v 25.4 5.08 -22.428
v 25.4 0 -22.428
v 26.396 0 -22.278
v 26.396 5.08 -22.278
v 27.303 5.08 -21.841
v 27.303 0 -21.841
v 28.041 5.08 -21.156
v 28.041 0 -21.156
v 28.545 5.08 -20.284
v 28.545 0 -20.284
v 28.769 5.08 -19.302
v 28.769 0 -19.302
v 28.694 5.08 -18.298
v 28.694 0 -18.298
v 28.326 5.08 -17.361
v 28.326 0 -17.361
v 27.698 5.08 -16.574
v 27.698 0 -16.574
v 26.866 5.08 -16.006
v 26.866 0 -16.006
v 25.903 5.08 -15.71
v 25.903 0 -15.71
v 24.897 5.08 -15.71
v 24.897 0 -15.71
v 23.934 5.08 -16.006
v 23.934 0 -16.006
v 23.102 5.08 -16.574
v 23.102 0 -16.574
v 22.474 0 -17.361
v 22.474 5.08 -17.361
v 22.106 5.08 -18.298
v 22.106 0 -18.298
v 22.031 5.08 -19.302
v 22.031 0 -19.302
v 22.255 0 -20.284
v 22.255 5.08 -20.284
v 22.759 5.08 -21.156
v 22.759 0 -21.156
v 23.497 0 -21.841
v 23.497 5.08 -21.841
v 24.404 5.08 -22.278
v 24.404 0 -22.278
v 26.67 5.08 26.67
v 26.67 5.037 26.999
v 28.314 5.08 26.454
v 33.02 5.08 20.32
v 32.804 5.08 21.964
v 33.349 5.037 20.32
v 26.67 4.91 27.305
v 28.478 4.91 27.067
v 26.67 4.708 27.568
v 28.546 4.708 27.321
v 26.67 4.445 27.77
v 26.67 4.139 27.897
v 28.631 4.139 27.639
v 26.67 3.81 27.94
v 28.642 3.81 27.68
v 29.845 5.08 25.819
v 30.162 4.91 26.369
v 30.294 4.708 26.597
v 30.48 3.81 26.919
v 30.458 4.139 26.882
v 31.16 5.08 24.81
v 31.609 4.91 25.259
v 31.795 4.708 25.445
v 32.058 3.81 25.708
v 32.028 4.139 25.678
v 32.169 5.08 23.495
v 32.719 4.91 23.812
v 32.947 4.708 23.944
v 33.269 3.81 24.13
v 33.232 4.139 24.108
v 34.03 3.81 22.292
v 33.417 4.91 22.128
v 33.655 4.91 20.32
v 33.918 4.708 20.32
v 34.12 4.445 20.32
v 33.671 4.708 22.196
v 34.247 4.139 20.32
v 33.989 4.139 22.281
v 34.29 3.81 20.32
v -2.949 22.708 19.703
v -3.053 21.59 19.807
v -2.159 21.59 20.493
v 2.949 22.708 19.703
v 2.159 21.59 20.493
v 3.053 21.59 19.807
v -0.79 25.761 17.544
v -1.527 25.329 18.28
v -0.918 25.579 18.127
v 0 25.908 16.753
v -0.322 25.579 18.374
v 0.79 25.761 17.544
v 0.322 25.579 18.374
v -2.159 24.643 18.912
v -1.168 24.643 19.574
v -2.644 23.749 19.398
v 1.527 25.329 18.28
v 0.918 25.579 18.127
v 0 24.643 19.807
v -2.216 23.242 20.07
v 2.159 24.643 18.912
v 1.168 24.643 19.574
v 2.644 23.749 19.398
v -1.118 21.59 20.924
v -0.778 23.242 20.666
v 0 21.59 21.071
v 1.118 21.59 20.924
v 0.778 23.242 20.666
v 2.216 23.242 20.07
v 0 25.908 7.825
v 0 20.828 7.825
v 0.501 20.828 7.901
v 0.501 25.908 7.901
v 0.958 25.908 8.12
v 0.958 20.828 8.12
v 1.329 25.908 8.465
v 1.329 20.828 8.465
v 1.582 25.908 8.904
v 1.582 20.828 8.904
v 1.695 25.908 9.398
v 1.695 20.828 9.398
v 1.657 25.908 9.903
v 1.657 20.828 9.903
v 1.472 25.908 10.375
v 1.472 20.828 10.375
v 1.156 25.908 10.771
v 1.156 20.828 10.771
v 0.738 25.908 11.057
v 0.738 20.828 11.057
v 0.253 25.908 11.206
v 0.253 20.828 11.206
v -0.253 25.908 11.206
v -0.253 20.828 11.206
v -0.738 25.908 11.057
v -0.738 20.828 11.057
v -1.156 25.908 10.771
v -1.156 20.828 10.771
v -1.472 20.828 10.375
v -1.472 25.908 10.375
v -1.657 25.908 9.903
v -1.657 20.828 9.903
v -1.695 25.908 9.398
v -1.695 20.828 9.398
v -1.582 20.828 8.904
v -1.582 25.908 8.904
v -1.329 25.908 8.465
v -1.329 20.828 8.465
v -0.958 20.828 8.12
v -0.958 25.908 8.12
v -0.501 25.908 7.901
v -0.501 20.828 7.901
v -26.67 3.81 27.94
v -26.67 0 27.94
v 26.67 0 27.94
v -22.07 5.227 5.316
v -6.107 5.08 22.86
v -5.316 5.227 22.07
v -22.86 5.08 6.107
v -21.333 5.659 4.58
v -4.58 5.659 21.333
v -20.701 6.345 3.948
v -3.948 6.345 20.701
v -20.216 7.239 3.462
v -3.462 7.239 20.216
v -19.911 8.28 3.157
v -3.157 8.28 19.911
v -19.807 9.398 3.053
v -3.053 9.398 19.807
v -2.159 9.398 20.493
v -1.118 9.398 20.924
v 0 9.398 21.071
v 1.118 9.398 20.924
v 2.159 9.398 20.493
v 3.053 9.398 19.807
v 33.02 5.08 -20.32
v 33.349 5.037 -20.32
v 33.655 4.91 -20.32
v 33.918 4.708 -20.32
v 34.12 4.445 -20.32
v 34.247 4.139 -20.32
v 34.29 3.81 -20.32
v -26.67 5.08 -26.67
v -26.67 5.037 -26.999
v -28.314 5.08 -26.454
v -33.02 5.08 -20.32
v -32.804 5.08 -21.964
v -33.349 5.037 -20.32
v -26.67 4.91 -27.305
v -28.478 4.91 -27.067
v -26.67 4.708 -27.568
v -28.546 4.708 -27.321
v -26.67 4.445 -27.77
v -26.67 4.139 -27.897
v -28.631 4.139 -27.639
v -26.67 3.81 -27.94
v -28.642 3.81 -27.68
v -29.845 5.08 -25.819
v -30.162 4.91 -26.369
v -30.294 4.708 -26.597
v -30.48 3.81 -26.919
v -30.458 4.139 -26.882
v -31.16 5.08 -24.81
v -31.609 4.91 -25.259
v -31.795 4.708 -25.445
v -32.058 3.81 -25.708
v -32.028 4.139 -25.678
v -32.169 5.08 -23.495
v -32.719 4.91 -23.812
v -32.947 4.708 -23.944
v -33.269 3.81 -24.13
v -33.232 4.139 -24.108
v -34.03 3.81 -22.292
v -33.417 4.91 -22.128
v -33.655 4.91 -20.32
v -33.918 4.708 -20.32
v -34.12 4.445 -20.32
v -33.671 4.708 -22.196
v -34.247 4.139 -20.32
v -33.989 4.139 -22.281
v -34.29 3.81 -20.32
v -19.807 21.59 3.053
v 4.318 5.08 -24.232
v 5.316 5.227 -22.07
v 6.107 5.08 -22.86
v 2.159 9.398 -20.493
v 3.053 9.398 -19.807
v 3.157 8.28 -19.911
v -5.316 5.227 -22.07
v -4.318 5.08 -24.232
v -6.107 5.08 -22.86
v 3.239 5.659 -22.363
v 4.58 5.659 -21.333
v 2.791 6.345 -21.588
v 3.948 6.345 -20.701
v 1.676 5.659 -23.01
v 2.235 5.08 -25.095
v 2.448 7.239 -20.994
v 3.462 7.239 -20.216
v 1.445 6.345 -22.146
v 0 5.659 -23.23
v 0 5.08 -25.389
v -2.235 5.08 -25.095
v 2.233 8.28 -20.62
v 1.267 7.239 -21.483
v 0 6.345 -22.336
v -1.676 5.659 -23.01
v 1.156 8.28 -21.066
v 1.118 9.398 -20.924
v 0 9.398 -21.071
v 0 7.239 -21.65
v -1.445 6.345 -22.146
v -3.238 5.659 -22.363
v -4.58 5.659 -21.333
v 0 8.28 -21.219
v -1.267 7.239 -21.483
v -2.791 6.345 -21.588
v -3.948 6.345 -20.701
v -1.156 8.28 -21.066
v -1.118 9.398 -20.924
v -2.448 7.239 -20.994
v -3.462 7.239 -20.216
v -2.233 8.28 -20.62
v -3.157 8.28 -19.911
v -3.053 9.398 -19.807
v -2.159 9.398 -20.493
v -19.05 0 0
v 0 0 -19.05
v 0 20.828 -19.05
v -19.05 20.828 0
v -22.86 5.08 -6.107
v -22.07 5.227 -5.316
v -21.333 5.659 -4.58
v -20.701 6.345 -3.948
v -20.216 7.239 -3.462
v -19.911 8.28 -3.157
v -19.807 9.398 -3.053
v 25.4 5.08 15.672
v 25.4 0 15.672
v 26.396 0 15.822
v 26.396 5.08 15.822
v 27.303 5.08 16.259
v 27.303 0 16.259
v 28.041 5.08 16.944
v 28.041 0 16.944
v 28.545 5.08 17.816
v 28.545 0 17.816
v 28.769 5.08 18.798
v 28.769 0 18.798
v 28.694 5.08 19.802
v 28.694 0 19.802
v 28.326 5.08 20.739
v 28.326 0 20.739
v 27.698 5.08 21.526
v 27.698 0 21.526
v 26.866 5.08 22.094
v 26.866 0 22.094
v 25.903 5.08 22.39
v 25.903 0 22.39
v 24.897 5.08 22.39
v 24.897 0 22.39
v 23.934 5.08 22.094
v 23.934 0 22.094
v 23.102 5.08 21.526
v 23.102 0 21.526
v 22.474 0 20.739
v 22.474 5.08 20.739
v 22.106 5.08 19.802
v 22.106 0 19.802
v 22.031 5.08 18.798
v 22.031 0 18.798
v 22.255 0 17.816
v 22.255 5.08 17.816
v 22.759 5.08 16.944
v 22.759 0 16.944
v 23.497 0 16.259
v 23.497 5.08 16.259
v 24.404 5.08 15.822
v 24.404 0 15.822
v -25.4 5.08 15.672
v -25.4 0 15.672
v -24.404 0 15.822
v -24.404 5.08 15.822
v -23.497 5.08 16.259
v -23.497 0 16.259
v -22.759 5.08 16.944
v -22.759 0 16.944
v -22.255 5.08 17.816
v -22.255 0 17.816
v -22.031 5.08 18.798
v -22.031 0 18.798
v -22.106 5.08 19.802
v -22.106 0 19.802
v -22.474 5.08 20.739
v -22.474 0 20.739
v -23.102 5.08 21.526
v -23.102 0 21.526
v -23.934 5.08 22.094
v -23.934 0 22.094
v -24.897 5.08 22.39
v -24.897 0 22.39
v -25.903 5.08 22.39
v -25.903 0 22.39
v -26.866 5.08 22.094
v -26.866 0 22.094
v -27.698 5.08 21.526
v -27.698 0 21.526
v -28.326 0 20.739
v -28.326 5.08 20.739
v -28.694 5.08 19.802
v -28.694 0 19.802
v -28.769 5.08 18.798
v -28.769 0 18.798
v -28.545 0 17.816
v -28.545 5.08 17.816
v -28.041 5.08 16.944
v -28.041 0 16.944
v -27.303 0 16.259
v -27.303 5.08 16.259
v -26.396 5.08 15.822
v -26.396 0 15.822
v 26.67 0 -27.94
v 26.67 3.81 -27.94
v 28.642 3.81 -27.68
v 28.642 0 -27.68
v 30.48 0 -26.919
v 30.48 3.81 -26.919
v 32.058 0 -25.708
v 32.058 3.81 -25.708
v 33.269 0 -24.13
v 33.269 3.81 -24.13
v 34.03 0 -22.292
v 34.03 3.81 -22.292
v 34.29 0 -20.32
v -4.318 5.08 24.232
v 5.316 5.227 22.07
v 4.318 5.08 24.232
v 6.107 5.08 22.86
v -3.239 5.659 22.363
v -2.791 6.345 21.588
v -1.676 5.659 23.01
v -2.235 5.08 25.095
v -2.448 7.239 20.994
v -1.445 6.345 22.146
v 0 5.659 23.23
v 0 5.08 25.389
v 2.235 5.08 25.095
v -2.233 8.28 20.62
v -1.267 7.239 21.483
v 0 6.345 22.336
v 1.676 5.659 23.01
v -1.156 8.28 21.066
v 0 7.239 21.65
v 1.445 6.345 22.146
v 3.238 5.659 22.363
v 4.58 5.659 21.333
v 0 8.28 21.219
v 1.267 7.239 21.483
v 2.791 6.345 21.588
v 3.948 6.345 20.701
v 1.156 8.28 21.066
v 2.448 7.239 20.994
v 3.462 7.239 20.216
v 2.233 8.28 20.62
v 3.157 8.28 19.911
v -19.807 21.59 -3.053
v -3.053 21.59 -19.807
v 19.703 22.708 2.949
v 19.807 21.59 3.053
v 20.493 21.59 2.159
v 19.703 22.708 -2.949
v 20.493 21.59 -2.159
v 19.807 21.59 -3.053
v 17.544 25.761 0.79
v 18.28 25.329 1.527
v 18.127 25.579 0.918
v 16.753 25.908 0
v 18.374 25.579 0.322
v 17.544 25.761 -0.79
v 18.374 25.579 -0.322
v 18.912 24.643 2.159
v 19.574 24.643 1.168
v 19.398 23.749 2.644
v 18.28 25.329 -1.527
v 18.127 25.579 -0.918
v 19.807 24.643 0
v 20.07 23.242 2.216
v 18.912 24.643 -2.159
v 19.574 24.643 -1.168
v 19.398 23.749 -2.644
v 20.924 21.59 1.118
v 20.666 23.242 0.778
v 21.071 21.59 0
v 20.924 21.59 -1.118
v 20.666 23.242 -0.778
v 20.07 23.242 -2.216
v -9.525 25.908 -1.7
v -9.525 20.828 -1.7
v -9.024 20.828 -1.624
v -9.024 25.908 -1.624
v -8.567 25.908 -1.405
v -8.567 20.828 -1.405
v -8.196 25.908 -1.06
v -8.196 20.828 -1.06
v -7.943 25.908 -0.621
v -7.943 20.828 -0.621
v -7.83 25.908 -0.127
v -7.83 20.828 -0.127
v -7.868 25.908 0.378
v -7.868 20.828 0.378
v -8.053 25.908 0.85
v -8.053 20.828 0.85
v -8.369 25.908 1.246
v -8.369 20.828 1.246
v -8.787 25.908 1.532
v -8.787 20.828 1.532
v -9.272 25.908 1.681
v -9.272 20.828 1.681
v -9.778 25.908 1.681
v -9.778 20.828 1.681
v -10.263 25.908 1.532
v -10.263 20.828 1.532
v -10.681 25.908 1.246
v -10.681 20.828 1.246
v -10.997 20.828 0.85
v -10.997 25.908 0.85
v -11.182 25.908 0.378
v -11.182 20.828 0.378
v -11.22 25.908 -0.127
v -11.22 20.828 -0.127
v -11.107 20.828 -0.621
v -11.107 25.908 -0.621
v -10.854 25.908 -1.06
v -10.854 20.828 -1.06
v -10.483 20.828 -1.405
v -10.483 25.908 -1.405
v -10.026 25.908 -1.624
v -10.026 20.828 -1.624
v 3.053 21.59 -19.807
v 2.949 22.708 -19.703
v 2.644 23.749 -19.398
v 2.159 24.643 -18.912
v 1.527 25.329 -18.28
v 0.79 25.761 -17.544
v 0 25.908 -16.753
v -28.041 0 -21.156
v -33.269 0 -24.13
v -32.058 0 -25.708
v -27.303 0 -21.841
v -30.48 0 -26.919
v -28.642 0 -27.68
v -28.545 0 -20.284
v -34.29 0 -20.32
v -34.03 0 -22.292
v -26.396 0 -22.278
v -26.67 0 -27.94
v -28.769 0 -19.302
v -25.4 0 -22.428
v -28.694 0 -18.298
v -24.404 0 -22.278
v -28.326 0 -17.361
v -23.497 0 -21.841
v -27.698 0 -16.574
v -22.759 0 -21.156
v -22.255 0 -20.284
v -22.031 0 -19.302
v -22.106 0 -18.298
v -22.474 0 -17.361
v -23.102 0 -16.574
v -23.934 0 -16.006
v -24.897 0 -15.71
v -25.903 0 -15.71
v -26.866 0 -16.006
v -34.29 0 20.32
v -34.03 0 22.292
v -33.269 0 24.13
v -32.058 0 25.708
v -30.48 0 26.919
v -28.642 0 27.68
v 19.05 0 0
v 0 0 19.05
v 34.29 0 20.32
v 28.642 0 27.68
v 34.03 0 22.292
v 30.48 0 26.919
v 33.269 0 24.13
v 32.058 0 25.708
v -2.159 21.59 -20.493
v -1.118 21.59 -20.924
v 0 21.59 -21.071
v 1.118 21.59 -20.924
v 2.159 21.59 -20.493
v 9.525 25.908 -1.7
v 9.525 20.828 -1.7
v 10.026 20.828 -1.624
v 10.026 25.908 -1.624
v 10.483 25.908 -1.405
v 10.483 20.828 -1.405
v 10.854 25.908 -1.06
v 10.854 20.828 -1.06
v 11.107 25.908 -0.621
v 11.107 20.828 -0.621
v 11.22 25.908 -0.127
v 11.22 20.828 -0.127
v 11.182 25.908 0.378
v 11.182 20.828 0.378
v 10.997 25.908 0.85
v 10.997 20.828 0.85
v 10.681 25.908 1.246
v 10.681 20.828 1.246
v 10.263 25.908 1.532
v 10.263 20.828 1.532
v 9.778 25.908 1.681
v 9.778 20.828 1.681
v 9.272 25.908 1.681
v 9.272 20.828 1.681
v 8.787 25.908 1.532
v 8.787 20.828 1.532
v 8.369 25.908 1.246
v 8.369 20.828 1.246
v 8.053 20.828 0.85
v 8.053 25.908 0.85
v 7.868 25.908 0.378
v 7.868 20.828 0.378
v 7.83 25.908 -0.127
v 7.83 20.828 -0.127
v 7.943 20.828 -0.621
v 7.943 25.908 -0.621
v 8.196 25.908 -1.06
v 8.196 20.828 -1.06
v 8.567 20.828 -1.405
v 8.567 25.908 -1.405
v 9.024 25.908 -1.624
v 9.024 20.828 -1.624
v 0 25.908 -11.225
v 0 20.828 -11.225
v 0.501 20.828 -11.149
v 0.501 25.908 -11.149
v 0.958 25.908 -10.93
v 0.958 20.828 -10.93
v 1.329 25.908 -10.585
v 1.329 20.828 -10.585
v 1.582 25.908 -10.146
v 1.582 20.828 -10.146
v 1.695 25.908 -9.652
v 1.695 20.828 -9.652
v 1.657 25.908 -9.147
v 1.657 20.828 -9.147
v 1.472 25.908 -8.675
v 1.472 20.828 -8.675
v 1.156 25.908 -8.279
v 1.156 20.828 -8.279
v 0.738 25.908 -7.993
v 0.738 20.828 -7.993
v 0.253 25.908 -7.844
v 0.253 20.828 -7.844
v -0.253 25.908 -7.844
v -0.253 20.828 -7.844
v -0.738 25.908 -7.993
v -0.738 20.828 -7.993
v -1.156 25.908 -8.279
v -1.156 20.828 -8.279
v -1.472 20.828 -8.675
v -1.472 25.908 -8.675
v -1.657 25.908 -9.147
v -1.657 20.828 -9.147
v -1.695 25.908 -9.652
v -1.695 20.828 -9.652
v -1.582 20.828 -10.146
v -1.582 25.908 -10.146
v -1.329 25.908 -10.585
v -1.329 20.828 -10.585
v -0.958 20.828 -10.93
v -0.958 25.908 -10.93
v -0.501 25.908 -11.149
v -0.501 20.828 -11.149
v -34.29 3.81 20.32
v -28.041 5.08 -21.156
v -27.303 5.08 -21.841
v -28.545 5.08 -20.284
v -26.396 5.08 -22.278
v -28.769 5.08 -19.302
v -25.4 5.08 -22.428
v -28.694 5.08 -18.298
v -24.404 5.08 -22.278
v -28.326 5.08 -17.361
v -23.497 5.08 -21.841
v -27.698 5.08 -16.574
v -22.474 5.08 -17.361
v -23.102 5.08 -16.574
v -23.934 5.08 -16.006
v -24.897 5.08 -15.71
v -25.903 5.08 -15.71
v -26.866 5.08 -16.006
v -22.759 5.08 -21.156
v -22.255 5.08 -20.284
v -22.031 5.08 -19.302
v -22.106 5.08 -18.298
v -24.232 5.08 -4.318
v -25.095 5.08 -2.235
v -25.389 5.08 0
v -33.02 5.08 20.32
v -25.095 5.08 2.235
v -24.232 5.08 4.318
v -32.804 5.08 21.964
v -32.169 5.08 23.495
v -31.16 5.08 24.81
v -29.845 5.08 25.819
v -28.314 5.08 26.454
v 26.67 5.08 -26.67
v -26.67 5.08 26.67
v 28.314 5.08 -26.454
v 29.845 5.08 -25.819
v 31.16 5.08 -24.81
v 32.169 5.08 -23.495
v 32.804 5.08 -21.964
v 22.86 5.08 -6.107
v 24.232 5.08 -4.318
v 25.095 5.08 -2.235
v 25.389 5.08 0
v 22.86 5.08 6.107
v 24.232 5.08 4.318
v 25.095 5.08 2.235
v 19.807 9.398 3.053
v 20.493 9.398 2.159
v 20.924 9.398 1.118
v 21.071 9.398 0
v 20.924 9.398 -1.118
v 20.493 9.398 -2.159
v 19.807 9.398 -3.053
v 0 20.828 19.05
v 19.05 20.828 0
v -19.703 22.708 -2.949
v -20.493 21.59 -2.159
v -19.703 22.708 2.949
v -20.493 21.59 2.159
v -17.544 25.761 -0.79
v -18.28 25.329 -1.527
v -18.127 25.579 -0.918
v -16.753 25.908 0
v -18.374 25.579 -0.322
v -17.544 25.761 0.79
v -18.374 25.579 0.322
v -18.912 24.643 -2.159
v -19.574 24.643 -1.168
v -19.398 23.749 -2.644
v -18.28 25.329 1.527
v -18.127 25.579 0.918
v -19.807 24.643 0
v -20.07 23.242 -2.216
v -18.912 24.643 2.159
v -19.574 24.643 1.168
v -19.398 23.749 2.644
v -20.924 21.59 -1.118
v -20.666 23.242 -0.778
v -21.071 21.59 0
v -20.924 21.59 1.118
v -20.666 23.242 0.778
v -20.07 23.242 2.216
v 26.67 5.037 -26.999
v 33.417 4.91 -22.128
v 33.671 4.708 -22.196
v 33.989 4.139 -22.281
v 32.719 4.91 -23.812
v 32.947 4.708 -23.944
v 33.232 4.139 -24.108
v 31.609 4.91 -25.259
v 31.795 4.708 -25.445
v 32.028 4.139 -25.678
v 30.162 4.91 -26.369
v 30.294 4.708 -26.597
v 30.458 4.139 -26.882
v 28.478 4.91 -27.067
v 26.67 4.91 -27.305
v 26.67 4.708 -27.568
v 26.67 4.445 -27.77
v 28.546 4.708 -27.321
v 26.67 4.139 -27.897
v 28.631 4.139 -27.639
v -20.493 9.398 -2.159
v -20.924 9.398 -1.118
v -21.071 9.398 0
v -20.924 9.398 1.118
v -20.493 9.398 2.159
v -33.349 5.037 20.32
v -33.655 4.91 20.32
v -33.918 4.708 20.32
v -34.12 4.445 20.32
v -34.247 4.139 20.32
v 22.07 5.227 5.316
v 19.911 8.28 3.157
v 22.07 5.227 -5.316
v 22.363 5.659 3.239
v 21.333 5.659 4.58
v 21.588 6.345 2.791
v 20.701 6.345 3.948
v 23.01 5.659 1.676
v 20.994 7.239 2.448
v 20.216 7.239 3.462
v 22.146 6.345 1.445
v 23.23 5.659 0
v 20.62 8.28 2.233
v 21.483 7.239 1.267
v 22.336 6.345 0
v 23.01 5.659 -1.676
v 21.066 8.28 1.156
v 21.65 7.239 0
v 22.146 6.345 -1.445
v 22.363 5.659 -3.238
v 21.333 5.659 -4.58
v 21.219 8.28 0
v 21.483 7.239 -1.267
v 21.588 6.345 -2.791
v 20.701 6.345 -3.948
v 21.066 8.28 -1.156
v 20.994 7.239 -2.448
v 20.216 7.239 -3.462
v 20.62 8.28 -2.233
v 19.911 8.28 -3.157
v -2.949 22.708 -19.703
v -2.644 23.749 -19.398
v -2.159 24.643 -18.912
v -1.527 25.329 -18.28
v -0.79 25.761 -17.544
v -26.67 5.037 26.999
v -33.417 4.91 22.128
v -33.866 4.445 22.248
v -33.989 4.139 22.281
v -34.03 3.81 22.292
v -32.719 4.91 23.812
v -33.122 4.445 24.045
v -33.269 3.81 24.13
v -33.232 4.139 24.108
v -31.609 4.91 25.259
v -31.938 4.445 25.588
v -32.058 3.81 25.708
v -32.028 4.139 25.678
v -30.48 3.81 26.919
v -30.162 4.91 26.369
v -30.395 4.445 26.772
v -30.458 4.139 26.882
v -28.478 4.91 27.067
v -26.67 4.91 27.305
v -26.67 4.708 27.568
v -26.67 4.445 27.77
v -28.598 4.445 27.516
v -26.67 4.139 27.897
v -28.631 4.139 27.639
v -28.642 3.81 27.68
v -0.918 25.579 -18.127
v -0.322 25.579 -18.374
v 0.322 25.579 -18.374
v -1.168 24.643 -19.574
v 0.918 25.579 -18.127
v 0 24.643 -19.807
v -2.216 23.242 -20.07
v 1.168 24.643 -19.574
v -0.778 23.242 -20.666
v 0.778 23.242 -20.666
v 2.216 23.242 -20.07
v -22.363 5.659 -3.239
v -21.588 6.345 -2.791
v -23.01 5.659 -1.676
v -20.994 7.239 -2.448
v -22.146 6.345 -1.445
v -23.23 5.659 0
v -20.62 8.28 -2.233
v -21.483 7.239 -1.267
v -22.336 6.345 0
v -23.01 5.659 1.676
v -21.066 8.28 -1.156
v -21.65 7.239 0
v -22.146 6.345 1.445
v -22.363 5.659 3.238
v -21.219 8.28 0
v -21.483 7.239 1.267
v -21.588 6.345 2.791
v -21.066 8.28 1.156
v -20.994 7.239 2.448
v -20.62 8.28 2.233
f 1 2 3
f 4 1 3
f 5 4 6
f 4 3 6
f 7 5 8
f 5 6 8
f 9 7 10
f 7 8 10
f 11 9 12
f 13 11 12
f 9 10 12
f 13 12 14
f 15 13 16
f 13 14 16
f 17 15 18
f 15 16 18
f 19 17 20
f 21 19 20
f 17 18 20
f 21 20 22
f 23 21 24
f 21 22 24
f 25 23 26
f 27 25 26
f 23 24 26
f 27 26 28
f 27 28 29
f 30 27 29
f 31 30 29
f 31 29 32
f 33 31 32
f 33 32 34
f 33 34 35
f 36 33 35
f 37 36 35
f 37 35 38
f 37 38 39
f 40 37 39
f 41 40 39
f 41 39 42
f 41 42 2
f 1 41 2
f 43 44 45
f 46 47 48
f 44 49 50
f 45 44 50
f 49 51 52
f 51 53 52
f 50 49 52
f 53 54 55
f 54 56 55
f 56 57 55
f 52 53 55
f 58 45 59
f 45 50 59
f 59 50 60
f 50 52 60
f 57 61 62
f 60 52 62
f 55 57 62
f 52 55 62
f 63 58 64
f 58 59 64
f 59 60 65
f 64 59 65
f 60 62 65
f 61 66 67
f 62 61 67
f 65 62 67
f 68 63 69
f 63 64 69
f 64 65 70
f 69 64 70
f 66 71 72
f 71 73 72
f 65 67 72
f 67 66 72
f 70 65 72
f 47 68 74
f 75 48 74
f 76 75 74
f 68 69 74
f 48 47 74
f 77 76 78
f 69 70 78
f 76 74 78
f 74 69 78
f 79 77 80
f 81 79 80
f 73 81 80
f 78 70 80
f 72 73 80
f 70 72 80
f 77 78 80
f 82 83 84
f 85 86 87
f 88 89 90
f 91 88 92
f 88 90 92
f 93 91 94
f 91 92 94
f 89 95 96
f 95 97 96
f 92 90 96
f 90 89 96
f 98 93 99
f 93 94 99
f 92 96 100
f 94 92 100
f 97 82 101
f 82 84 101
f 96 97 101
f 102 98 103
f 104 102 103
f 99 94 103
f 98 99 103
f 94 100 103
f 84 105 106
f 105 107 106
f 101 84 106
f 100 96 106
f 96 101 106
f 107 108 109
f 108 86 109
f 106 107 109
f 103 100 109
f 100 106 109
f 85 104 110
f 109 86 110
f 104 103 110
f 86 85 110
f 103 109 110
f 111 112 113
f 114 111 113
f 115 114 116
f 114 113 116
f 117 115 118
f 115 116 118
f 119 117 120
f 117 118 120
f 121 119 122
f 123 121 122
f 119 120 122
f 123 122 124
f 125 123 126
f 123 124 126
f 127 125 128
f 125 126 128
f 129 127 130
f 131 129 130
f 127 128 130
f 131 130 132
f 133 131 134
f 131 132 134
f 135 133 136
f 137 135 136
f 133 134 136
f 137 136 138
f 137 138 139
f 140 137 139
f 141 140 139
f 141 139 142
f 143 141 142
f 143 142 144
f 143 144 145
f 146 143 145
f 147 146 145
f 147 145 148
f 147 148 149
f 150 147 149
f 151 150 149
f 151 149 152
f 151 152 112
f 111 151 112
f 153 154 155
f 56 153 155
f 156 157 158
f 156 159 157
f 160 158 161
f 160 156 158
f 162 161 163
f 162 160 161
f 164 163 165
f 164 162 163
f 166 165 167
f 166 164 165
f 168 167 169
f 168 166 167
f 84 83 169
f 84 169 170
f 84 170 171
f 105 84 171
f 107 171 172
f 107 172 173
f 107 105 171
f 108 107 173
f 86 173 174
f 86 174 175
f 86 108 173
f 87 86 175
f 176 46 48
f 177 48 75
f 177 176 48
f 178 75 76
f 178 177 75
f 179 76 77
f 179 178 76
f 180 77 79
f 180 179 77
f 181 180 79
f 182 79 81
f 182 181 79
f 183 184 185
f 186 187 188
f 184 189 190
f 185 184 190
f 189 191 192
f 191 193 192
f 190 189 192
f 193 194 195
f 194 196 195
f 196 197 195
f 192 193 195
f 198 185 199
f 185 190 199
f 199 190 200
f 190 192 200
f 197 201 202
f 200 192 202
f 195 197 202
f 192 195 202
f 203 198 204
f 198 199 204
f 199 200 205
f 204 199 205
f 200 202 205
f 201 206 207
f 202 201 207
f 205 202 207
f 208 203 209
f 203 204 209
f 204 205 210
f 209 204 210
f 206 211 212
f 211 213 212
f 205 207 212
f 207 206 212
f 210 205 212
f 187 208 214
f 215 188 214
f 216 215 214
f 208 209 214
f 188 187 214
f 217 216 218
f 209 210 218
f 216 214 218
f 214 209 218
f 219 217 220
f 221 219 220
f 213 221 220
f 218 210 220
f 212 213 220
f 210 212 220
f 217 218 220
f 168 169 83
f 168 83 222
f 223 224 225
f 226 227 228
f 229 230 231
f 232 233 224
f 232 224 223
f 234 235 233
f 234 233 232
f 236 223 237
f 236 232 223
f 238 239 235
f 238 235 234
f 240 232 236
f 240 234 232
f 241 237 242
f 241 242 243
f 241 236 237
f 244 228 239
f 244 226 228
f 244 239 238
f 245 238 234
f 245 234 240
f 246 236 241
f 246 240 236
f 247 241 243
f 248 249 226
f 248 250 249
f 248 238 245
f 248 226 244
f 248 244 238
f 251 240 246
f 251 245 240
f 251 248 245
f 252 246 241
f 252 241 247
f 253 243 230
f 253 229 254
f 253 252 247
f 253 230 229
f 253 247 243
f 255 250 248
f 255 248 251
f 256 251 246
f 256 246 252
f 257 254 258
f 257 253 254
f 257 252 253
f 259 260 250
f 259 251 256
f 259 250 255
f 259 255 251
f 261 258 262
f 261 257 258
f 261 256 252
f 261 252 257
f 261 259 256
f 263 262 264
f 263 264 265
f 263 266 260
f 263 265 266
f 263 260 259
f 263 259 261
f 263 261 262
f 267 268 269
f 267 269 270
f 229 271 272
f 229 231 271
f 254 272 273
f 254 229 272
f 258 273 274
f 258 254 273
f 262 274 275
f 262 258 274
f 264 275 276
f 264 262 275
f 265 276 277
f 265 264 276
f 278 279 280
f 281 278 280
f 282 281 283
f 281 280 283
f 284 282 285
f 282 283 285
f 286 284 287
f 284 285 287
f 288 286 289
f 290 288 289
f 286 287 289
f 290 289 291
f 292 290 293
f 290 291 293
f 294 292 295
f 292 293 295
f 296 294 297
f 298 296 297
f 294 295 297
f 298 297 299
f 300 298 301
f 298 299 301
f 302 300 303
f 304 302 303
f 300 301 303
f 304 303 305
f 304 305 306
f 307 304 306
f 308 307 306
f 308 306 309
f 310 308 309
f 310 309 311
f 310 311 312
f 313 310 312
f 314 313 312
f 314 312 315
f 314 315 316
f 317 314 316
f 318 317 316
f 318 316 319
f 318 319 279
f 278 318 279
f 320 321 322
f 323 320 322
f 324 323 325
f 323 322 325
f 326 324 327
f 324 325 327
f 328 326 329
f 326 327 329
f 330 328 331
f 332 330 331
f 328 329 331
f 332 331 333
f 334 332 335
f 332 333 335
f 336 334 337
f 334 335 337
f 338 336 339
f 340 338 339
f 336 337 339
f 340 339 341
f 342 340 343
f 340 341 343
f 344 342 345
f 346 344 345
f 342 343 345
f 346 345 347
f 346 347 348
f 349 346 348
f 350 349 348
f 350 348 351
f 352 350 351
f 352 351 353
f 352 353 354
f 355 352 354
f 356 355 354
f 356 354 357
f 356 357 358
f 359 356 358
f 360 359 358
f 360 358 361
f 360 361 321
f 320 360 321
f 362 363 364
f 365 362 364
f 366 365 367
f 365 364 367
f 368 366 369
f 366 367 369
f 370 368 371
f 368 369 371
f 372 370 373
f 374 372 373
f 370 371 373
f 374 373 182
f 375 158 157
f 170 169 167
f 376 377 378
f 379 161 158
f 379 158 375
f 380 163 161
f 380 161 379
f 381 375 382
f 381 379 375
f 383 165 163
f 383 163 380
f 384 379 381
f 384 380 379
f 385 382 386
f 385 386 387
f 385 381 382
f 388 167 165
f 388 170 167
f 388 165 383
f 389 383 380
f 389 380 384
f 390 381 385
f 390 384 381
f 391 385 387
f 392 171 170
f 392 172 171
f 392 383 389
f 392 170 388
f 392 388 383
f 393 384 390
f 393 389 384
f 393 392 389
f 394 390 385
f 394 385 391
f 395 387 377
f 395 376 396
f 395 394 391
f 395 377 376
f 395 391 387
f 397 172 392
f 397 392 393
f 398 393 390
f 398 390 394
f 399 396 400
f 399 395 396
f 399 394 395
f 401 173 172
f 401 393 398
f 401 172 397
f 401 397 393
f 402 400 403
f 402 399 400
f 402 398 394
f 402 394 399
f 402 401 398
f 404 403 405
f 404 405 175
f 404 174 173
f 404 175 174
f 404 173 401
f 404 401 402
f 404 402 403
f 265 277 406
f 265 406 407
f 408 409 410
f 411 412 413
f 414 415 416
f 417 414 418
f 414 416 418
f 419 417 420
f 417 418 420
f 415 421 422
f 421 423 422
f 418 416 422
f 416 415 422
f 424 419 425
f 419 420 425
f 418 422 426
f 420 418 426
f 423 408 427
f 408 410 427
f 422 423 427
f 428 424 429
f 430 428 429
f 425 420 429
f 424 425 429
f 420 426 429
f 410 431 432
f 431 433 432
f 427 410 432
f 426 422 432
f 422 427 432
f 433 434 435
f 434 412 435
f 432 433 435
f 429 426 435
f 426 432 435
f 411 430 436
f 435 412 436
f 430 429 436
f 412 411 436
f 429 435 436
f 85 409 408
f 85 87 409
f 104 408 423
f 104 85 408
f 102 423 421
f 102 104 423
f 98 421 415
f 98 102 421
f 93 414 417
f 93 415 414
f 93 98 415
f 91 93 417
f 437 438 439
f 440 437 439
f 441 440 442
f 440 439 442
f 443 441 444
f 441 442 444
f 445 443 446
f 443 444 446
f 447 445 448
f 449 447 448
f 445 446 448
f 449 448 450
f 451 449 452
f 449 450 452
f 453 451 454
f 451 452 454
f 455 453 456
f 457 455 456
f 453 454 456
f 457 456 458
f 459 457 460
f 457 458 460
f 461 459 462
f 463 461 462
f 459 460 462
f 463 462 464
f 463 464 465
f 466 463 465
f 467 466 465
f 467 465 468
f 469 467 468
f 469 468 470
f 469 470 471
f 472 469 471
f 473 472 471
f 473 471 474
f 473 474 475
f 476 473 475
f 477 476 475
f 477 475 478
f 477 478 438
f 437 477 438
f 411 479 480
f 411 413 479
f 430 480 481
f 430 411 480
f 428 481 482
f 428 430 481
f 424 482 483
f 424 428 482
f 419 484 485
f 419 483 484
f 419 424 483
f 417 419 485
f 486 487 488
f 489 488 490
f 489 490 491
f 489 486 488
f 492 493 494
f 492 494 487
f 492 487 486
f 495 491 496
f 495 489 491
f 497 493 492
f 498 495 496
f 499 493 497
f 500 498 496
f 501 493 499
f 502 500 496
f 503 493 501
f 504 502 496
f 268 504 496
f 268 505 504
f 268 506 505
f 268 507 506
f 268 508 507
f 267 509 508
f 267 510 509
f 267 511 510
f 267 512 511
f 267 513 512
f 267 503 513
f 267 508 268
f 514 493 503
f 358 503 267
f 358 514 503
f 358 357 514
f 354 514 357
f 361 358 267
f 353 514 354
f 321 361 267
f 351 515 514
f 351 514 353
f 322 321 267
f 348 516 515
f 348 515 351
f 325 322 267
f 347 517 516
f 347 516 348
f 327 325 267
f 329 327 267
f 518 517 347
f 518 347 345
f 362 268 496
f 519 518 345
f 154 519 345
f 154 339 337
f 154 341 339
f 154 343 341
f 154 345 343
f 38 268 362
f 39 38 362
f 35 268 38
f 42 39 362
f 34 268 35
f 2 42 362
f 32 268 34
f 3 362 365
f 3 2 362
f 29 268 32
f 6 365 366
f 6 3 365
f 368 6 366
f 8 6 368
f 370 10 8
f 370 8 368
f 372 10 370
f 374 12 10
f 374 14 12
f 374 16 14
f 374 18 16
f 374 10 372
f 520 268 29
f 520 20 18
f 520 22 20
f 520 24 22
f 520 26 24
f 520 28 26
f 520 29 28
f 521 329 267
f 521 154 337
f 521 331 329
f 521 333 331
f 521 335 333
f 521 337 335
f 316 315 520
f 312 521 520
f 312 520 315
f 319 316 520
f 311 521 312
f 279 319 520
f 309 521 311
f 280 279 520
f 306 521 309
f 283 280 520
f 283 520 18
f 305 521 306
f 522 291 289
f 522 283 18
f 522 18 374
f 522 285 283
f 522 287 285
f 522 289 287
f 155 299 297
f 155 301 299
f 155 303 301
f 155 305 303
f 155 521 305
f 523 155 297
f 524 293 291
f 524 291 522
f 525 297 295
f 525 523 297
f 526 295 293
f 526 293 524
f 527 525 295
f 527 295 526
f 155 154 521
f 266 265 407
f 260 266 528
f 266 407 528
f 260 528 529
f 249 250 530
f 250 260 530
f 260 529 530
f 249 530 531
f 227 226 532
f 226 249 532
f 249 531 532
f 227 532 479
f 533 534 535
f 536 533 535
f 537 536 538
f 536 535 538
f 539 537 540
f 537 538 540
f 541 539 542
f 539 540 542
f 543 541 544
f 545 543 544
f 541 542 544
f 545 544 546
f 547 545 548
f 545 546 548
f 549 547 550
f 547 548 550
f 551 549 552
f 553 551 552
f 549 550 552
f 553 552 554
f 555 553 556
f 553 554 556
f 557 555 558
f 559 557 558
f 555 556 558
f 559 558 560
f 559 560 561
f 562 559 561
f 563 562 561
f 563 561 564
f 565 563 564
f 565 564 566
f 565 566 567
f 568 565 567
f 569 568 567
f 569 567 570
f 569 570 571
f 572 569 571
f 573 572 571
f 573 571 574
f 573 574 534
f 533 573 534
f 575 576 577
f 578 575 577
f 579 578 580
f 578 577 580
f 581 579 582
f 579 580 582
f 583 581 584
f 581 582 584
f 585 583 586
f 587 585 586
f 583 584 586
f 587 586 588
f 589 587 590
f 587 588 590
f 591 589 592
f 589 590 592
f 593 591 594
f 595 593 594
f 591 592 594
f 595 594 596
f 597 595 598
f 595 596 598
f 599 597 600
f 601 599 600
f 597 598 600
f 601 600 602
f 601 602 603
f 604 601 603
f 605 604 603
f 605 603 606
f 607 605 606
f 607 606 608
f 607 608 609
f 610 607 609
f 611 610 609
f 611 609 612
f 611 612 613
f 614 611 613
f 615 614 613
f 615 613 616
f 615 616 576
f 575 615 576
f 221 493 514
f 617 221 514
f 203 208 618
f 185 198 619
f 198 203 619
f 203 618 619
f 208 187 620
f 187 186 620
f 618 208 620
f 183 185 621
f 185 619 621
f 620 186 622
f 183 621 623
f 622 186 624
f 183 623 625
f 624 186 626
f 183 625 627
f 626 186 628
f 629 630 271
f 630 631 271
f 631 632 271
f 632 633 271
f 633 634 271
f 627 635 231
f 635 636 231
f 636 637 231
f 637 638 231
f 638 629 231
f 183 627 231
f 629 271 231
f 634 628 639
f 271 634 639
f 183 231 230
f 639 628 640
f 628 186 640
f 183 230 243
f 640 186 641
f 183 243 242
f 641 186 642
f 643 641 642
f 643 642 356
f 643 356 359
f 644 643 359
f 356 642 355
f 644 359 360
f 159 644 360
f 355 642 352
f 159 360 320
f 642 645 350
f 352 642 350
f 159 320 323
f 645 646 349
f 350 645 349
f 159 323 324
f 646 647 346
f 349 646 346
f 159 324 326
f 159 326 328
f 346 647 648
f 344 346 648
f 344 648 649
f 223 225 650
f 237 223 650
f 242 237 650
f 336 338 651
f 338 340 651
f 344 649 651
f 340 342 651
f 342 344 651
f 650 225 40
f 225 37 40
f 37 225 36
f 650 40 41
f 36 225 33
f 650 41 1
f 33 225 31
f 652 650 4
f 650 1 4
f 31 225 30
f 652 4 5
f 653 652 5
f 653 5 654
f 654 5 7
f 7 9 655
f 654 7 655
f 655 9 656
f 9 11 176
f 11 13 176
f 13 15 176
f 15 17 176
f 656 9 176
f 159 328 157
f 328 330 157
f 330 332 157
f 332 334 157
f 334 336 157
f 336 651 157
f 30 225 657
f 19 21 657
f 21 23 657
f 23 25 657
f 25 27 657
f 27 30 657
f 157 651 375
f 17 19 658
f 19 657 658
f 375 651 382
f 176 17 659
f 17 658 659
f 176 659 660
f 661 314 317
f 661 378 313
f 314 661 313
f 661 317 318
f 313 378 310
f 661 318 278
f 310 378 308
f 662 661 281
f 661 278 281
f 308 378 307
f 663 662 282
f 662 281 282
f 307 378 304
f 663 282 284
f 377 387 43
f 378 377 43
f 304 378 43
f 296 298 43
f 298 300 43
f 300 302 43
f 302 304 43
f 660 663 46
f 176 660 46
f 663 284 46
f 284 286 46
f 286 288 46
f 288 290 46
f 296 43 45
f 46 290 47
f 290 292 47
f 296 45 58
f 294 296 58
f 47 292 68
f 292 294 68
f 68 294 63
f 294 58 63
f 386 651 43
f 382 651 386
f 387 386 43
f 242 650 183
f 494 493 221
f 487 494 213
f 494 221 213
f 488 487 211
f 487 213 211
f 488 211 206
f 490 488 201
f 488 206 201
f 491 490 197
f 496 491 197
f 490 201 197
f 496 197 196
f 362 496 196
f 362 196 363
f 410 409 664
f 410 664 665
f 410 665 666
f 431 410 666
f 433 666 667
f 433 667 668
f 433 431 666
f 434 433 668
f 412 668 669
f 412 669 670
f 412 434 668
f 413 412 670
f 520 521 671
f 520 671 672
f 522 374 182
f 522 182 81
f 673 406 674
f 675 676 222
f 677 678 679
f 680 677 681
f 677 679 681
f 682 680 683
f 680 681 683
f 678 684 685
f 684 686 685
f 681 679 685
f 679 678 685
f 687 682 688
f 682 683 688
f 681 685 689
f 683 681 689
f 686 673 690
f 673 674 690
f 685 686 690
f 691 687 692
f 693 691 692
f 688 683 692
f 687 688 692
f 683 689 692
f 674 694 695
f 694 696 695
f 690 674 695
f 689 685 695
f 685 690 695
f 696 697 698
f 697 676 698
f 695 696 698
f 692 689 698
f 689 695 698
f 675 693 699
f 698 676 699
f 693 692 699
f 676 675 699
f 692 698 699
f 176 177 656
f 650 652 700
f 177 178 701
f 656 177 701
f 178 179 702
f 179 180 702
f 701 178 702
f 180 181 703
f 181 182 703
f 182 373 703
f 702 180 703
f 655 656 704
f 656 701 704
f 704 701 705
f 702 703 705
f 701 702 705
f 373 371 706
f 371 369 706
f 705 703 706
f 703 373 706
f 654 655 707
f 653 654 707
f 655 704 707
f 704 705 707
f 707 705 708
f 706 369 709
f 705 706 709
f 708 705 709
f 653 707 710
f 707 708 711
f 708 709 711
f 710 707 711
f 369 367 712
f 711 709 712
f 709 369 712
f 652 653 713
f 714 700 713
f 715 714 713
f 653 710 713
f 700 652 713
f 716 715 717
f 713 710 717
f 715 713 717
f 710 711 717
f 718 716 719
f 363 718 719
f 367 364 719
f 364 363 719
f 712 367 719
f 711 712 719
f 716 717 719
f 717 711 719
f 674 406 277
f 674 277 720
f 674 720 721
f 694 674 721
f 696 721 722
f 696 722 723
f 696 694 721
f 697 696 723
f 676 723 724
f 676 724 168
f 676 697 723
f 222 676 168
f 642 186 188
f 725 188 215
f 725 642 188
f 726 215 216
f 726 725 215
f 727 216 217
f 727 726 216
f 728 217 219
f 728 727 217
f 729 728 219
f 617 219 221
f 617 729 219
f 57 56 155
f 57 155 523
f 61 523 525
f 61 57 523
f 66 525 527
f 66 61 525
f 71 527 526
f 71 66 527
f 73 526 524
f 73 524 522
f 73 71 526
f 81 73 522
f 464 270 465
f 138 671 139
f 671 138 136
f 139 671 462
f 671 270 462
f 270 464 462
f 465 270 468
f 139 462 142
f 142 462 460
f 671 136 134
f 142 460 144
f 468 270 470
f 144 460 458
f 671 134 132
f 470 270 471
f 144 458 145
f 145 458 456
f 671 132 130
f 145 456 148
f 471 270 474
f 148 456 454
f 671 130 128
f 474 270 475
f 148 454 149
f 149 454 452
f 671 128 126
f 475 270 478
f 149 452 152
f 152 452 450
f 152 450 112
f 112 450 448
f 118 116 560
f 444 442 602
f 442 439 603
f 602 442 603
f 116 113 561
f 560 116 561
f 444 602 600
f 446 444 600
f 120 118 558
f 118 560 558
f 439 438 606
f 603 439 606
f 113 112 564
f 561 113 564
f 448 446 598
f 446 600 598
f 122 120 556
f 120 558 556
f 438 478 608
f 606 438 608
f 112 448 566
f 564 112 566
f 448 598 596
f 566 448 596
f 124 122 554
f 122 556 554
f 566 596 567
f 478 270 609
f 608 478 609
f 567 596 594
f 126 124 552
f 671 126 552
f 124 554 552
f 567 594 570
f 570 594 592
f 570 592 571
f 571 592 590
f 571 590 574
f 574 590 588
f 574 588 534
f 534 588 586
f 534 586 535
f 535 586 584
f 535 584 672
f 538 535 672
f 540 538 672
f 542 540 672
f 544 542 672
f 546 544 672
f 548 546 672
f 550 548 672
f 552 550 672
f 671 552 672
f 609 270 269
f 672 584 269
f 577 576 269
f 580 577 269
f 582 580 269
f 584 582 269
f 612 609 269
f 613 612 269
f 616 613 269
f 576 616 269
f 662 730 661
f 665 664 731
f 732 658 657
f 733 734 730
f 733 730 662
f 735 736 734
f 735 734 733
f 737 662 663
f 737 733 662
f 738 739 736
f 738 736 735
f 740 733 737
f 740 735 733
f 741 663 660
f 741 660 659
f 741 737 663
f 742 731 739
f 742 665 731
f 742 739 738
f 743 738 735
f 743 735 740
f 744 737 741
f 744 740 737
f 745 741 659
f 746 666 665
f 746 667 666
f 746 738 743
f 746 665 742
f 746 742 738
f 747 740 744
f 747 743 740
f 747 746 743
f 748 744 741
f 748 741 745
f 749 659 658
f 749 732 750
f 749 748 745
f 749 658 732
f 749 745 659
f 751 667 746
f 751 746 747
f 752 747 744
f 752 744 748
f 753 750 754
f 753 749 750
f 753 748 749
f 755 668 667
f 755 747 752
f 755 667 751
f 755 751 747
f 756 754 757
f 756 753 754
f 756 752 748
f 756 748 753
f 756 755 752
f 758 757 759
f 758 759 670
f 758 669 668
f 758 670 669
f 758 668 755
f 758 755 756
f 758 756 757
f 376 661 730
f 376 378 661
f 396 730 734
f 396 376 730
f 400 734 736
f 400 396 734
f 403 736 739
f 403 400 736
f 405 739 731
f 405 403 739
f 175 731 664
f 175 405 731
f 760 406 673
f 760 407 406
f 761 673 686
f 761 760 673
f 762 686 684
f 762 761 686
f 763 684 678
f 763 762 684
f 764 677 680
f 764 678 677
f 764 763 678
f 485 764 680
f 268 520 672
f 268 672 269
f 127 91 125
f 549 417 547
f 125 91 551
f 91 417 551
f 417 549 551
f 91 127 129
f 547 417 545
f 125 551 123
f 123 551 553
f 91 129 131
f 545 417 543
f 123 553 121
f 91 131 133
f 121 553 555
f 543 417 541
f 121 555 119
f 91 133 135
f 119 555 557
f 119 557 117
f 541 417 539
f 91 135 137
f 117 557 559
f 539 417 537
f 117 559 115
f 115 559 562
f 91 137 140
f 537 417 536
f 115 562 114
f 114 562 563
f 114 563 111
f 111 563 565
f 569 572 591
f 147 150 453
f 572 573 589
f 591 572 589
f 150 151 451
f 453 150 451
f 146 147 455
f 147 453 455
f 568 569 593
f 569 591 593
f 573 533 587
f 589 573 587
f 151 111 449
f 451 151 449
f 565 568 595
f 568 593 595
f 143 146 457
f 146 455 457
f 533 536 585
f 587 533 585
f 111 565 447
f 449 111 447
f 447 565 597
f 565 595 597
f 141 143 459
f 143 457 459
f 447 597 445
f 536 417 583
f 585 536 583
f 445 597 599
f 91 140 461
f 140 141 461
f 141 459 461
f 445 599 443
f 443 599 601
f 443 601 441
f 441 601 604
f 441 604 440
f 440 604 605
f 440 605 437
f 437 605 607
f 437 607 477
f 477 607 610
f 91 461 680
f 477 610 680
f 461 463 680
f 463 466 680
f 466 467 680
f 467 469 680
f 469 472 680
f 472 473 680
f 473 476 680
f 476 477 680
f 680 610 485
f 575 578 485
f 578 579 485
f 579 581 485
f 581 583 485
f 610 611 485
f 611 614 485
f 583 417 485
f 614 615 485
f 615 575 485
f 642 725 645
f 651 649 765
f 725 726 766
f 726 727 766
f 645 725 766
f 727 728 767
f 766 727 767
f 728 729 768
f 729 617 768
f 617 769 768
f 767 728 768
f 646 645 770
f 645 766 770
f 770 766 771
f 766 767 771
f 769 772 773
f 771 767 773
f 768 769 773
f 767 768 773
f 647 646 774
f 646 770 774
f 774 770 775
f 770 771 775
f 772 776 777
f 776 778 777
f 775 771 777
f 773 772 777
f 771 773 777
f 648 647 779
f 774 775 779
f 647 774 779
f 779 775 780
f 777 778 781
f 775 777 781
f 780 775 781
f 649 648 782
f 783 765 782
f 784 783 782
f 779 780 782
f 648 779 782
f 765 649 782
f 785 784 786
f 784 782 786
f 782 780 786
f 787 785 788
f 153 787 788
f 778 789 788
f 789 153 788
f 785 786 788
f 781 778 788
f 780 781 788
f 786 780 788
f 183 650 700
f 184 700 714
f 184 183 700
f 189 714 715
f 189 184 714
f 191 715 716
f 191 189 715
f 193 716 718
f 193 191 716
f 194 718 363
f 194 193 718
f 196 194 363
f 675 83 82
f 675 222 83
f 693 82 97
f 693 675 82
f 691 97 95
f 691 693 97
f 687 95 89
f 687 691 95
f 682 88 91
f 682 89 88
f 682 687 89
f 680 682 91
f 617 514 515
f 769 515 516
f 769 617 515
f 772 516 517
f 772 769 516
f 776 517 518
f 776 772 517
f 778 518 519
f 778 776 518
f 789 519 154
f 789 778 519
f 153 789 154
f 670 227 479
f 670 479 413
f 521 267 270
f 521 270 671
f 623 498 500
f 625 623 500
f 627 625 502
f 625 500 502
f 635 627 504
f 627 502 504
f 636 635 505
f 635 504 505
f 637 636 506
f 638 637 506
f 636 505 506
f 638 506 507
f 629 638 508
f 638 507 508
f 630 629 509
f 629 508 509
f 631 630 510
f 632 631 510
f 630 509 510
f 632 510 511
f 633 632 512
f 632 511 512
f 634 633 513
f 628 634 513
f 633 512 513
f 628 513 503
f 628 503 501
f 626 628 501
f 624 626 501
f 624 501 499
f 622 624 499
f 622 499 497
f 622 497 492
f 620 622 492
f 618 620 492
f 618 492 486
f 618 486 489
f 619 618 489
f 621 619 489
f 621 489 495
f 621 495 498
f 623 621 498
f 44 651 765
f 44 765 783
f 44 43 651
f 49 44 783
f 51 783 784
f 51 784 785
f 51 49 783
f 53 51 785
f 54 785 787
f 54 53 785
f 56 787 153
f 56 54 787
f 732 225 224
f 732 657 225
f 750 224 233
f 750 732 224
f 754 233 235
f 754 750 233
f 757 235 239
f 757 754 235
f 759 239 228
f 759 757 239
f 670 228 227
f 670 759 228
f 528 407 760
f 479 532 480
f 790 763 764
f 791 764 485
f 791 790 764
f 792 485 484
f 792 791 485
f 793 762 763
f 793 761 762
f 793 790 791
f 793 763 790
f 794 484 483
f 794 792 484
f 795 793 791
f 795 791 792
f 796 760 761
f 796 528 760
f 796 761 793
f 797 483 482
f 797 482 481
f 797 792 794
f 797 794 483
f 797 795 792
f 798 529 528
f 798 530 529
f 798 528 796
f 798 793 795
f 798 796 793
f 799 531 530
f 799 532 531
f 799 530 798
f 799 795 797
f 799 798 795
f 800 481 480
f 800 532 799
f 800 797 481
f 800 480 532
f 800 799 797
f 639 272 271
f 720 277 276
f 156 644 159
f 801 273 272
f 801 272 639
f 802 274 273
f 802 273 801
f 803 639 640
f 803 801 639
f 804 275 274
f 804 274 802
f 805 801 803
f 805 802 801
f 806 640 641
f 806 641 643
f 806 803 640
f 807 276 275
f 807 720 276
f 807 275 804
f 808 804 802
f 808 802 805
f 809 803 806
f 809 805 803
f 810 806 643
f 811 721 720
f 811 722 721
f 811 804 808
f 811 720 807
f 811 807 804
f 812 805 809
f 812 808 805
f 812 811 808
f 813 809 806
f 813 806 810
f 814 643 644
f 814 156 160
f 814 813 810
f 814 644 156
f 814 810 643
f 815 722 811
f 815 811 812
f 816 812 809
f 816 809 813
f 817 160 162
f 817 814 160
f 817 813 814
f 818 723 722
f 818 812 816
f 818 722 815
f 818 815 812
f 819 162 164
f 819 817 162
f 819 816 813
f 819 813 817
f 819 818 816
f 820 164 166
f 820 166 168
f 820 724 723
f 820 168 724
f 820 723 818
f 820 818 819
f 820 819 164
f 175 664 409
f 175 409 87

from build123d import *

# Parameters (mm, degrees)
SKETCH4_W               = 63.5
SKETCH4_H               = 50.8
BOSS_EXTRUDE2_DEPTH     = 5.08
F_1_4_CLEARANCE_HOLE2_D = 6.7564
BOSS_EXTRUDE3_DEPTH     = 20.828
M3_CLEARANCE_HOLE1_D    = 3.4
CUT_EXTRUDE1_DEPTH      = 20.828
FILLET2_R               = 4.318
SKETCH13_W              = 68.58
SKETCH13_H              = 55.88
SKETCH13_W_2            = 63.5
SKETCH13_H_2            = 50.8
BOSS_EXTRUDE4_DEPTH     = 5.08
FILLET3_R               = 7.62
FILLET4_R               = 1.27


with BuildPart() as part:
    # Sketch4 → Boss-Extrude2 (new body)
    with BuildSketch(Plane(origin=(0, 0, 0), x_dir=(1, 0, 0), z_dir=(0, 1, 0))):
        Rectangle(SKETCH4_W, SKETCH4_H)
    extrude(amount=BOSS_EXTRUDE2_DEPTH)

    # 1/4 Clearance Hole2 (through all)
    with Locations(Plane(origin=(-25.4, 5.08, -19.05), x_dir=(0, 0, 1), z_dir=(0, 1, 0))):
        with Locations((0, 0), (0, 50.8), (38.1, 50.8), (38.1, 0)):
            Hole(F_1_4_CLEARANCE_HOLE2_D / 2)

    # Sketch7 → Boss-Extrude3 (add)
    with BuildSketch(Plane(origin=(0, 5.08, 0), x_dir=(1, 0, 0), z_dir=(0, 1, 0))):
        Polygon((0, 22.86), (22.86, 0), (0, -22.86), (-22.86, 0), align=None)
    extrude(amount=BOSS_EXTRUDE3_DEPTH)

    # M3 Clearance Hole1 (through all)
    with Locations(Plane(origin=(0, 25.908, -9.525), x_dir=(0, 0, 1), z_dir=(0, 1, 0))):
        with Locations((0, 0), (9.525, 9.525), (19.05, 0), (9.525, -9.525)):
            Hole(M3_CLEARANCE_HOLE1_D / 2)

    # Sketch12 → Cut-Extrude1 (cut)
    with BuildSketch(Plane(origin=(0, 0, 0), x_dir=(-1, 0, 0), z_dir=(0, -1, 0))):
        Polygon((0, -19.05), (-19.05, 0), (0, 19.05), (19.05, 0), align=None)
    extrude(amount=-CUT_EXTRUDE1_DEPTH, mode=Mode.SUBTRACT)

    # Fillet2
    fillet2_edges = [part.edges().sort_by_distance(p)[0] for p in [
        (-11.43, 5.08, -11.43),
        (0, 15.494, -22.86),
        (-11.43, 5.08, 11.43),
        (-22.86, 15.494, 0),
        (11.43, 5.08, 11.43),
        (0, 15.494, 22.86),
        (11.43, 5.08, -11.43),
        (22.86, 15.494, 0),
        (-11.43, 25.908, -11.43),
        (-11.43, 25.908, 11.43),
        (11.43, 25.908, 11.43),
        (11.43, 25.908, -11.43),
    ]]
    fillet(fillet2_edges, radius=FILLET2_R)

    # Sketch13 → Boss-Extrude4 (add)
    with BuildSketch(Plane.XZ):
        Rectangle(SKETCH13_W, SKETCH13_H)
        Rectangle(SKETCH13_W_2, SKETCH13_H_2, mode=Mode.SUBTRACT)
    extrude(amount=-BOSS_EXTRUDE4_DEPTH)

    # Fillet3
    fillet3_edges = [part.edges().sort_by_distance(p)[0] for p in [
        (-34.29, 2.54, -27.94),
        (-34.29, 2.54, 27.94),
        (34.29, 2.54, 27.94),
        (34.29, 2.54, -27.94),
    ]]
    fillet(fillet3_edges, radius=FILLET3_R)

    # Fillet4
    fillet4_edges = [part.edges().sort_by_distance(p)[0] for p in [
        (0, 5.08, 27.94),
        (-34.29, 5.08, 0),
        (34.29, 5.08, 0),
        (0, 5.08, -27.94),
        (32.058153673, 5.08, -25.708153673),
        (32.058153673, 5.08, 25.708153673),
        (-32.058153673, 5.08, -25.708153673),
        (-32.058153673, 5.08, 25.708153673),
    ]]
    fillet(fillet4_edges, radius=FILLET4_R)


solid = part.part
